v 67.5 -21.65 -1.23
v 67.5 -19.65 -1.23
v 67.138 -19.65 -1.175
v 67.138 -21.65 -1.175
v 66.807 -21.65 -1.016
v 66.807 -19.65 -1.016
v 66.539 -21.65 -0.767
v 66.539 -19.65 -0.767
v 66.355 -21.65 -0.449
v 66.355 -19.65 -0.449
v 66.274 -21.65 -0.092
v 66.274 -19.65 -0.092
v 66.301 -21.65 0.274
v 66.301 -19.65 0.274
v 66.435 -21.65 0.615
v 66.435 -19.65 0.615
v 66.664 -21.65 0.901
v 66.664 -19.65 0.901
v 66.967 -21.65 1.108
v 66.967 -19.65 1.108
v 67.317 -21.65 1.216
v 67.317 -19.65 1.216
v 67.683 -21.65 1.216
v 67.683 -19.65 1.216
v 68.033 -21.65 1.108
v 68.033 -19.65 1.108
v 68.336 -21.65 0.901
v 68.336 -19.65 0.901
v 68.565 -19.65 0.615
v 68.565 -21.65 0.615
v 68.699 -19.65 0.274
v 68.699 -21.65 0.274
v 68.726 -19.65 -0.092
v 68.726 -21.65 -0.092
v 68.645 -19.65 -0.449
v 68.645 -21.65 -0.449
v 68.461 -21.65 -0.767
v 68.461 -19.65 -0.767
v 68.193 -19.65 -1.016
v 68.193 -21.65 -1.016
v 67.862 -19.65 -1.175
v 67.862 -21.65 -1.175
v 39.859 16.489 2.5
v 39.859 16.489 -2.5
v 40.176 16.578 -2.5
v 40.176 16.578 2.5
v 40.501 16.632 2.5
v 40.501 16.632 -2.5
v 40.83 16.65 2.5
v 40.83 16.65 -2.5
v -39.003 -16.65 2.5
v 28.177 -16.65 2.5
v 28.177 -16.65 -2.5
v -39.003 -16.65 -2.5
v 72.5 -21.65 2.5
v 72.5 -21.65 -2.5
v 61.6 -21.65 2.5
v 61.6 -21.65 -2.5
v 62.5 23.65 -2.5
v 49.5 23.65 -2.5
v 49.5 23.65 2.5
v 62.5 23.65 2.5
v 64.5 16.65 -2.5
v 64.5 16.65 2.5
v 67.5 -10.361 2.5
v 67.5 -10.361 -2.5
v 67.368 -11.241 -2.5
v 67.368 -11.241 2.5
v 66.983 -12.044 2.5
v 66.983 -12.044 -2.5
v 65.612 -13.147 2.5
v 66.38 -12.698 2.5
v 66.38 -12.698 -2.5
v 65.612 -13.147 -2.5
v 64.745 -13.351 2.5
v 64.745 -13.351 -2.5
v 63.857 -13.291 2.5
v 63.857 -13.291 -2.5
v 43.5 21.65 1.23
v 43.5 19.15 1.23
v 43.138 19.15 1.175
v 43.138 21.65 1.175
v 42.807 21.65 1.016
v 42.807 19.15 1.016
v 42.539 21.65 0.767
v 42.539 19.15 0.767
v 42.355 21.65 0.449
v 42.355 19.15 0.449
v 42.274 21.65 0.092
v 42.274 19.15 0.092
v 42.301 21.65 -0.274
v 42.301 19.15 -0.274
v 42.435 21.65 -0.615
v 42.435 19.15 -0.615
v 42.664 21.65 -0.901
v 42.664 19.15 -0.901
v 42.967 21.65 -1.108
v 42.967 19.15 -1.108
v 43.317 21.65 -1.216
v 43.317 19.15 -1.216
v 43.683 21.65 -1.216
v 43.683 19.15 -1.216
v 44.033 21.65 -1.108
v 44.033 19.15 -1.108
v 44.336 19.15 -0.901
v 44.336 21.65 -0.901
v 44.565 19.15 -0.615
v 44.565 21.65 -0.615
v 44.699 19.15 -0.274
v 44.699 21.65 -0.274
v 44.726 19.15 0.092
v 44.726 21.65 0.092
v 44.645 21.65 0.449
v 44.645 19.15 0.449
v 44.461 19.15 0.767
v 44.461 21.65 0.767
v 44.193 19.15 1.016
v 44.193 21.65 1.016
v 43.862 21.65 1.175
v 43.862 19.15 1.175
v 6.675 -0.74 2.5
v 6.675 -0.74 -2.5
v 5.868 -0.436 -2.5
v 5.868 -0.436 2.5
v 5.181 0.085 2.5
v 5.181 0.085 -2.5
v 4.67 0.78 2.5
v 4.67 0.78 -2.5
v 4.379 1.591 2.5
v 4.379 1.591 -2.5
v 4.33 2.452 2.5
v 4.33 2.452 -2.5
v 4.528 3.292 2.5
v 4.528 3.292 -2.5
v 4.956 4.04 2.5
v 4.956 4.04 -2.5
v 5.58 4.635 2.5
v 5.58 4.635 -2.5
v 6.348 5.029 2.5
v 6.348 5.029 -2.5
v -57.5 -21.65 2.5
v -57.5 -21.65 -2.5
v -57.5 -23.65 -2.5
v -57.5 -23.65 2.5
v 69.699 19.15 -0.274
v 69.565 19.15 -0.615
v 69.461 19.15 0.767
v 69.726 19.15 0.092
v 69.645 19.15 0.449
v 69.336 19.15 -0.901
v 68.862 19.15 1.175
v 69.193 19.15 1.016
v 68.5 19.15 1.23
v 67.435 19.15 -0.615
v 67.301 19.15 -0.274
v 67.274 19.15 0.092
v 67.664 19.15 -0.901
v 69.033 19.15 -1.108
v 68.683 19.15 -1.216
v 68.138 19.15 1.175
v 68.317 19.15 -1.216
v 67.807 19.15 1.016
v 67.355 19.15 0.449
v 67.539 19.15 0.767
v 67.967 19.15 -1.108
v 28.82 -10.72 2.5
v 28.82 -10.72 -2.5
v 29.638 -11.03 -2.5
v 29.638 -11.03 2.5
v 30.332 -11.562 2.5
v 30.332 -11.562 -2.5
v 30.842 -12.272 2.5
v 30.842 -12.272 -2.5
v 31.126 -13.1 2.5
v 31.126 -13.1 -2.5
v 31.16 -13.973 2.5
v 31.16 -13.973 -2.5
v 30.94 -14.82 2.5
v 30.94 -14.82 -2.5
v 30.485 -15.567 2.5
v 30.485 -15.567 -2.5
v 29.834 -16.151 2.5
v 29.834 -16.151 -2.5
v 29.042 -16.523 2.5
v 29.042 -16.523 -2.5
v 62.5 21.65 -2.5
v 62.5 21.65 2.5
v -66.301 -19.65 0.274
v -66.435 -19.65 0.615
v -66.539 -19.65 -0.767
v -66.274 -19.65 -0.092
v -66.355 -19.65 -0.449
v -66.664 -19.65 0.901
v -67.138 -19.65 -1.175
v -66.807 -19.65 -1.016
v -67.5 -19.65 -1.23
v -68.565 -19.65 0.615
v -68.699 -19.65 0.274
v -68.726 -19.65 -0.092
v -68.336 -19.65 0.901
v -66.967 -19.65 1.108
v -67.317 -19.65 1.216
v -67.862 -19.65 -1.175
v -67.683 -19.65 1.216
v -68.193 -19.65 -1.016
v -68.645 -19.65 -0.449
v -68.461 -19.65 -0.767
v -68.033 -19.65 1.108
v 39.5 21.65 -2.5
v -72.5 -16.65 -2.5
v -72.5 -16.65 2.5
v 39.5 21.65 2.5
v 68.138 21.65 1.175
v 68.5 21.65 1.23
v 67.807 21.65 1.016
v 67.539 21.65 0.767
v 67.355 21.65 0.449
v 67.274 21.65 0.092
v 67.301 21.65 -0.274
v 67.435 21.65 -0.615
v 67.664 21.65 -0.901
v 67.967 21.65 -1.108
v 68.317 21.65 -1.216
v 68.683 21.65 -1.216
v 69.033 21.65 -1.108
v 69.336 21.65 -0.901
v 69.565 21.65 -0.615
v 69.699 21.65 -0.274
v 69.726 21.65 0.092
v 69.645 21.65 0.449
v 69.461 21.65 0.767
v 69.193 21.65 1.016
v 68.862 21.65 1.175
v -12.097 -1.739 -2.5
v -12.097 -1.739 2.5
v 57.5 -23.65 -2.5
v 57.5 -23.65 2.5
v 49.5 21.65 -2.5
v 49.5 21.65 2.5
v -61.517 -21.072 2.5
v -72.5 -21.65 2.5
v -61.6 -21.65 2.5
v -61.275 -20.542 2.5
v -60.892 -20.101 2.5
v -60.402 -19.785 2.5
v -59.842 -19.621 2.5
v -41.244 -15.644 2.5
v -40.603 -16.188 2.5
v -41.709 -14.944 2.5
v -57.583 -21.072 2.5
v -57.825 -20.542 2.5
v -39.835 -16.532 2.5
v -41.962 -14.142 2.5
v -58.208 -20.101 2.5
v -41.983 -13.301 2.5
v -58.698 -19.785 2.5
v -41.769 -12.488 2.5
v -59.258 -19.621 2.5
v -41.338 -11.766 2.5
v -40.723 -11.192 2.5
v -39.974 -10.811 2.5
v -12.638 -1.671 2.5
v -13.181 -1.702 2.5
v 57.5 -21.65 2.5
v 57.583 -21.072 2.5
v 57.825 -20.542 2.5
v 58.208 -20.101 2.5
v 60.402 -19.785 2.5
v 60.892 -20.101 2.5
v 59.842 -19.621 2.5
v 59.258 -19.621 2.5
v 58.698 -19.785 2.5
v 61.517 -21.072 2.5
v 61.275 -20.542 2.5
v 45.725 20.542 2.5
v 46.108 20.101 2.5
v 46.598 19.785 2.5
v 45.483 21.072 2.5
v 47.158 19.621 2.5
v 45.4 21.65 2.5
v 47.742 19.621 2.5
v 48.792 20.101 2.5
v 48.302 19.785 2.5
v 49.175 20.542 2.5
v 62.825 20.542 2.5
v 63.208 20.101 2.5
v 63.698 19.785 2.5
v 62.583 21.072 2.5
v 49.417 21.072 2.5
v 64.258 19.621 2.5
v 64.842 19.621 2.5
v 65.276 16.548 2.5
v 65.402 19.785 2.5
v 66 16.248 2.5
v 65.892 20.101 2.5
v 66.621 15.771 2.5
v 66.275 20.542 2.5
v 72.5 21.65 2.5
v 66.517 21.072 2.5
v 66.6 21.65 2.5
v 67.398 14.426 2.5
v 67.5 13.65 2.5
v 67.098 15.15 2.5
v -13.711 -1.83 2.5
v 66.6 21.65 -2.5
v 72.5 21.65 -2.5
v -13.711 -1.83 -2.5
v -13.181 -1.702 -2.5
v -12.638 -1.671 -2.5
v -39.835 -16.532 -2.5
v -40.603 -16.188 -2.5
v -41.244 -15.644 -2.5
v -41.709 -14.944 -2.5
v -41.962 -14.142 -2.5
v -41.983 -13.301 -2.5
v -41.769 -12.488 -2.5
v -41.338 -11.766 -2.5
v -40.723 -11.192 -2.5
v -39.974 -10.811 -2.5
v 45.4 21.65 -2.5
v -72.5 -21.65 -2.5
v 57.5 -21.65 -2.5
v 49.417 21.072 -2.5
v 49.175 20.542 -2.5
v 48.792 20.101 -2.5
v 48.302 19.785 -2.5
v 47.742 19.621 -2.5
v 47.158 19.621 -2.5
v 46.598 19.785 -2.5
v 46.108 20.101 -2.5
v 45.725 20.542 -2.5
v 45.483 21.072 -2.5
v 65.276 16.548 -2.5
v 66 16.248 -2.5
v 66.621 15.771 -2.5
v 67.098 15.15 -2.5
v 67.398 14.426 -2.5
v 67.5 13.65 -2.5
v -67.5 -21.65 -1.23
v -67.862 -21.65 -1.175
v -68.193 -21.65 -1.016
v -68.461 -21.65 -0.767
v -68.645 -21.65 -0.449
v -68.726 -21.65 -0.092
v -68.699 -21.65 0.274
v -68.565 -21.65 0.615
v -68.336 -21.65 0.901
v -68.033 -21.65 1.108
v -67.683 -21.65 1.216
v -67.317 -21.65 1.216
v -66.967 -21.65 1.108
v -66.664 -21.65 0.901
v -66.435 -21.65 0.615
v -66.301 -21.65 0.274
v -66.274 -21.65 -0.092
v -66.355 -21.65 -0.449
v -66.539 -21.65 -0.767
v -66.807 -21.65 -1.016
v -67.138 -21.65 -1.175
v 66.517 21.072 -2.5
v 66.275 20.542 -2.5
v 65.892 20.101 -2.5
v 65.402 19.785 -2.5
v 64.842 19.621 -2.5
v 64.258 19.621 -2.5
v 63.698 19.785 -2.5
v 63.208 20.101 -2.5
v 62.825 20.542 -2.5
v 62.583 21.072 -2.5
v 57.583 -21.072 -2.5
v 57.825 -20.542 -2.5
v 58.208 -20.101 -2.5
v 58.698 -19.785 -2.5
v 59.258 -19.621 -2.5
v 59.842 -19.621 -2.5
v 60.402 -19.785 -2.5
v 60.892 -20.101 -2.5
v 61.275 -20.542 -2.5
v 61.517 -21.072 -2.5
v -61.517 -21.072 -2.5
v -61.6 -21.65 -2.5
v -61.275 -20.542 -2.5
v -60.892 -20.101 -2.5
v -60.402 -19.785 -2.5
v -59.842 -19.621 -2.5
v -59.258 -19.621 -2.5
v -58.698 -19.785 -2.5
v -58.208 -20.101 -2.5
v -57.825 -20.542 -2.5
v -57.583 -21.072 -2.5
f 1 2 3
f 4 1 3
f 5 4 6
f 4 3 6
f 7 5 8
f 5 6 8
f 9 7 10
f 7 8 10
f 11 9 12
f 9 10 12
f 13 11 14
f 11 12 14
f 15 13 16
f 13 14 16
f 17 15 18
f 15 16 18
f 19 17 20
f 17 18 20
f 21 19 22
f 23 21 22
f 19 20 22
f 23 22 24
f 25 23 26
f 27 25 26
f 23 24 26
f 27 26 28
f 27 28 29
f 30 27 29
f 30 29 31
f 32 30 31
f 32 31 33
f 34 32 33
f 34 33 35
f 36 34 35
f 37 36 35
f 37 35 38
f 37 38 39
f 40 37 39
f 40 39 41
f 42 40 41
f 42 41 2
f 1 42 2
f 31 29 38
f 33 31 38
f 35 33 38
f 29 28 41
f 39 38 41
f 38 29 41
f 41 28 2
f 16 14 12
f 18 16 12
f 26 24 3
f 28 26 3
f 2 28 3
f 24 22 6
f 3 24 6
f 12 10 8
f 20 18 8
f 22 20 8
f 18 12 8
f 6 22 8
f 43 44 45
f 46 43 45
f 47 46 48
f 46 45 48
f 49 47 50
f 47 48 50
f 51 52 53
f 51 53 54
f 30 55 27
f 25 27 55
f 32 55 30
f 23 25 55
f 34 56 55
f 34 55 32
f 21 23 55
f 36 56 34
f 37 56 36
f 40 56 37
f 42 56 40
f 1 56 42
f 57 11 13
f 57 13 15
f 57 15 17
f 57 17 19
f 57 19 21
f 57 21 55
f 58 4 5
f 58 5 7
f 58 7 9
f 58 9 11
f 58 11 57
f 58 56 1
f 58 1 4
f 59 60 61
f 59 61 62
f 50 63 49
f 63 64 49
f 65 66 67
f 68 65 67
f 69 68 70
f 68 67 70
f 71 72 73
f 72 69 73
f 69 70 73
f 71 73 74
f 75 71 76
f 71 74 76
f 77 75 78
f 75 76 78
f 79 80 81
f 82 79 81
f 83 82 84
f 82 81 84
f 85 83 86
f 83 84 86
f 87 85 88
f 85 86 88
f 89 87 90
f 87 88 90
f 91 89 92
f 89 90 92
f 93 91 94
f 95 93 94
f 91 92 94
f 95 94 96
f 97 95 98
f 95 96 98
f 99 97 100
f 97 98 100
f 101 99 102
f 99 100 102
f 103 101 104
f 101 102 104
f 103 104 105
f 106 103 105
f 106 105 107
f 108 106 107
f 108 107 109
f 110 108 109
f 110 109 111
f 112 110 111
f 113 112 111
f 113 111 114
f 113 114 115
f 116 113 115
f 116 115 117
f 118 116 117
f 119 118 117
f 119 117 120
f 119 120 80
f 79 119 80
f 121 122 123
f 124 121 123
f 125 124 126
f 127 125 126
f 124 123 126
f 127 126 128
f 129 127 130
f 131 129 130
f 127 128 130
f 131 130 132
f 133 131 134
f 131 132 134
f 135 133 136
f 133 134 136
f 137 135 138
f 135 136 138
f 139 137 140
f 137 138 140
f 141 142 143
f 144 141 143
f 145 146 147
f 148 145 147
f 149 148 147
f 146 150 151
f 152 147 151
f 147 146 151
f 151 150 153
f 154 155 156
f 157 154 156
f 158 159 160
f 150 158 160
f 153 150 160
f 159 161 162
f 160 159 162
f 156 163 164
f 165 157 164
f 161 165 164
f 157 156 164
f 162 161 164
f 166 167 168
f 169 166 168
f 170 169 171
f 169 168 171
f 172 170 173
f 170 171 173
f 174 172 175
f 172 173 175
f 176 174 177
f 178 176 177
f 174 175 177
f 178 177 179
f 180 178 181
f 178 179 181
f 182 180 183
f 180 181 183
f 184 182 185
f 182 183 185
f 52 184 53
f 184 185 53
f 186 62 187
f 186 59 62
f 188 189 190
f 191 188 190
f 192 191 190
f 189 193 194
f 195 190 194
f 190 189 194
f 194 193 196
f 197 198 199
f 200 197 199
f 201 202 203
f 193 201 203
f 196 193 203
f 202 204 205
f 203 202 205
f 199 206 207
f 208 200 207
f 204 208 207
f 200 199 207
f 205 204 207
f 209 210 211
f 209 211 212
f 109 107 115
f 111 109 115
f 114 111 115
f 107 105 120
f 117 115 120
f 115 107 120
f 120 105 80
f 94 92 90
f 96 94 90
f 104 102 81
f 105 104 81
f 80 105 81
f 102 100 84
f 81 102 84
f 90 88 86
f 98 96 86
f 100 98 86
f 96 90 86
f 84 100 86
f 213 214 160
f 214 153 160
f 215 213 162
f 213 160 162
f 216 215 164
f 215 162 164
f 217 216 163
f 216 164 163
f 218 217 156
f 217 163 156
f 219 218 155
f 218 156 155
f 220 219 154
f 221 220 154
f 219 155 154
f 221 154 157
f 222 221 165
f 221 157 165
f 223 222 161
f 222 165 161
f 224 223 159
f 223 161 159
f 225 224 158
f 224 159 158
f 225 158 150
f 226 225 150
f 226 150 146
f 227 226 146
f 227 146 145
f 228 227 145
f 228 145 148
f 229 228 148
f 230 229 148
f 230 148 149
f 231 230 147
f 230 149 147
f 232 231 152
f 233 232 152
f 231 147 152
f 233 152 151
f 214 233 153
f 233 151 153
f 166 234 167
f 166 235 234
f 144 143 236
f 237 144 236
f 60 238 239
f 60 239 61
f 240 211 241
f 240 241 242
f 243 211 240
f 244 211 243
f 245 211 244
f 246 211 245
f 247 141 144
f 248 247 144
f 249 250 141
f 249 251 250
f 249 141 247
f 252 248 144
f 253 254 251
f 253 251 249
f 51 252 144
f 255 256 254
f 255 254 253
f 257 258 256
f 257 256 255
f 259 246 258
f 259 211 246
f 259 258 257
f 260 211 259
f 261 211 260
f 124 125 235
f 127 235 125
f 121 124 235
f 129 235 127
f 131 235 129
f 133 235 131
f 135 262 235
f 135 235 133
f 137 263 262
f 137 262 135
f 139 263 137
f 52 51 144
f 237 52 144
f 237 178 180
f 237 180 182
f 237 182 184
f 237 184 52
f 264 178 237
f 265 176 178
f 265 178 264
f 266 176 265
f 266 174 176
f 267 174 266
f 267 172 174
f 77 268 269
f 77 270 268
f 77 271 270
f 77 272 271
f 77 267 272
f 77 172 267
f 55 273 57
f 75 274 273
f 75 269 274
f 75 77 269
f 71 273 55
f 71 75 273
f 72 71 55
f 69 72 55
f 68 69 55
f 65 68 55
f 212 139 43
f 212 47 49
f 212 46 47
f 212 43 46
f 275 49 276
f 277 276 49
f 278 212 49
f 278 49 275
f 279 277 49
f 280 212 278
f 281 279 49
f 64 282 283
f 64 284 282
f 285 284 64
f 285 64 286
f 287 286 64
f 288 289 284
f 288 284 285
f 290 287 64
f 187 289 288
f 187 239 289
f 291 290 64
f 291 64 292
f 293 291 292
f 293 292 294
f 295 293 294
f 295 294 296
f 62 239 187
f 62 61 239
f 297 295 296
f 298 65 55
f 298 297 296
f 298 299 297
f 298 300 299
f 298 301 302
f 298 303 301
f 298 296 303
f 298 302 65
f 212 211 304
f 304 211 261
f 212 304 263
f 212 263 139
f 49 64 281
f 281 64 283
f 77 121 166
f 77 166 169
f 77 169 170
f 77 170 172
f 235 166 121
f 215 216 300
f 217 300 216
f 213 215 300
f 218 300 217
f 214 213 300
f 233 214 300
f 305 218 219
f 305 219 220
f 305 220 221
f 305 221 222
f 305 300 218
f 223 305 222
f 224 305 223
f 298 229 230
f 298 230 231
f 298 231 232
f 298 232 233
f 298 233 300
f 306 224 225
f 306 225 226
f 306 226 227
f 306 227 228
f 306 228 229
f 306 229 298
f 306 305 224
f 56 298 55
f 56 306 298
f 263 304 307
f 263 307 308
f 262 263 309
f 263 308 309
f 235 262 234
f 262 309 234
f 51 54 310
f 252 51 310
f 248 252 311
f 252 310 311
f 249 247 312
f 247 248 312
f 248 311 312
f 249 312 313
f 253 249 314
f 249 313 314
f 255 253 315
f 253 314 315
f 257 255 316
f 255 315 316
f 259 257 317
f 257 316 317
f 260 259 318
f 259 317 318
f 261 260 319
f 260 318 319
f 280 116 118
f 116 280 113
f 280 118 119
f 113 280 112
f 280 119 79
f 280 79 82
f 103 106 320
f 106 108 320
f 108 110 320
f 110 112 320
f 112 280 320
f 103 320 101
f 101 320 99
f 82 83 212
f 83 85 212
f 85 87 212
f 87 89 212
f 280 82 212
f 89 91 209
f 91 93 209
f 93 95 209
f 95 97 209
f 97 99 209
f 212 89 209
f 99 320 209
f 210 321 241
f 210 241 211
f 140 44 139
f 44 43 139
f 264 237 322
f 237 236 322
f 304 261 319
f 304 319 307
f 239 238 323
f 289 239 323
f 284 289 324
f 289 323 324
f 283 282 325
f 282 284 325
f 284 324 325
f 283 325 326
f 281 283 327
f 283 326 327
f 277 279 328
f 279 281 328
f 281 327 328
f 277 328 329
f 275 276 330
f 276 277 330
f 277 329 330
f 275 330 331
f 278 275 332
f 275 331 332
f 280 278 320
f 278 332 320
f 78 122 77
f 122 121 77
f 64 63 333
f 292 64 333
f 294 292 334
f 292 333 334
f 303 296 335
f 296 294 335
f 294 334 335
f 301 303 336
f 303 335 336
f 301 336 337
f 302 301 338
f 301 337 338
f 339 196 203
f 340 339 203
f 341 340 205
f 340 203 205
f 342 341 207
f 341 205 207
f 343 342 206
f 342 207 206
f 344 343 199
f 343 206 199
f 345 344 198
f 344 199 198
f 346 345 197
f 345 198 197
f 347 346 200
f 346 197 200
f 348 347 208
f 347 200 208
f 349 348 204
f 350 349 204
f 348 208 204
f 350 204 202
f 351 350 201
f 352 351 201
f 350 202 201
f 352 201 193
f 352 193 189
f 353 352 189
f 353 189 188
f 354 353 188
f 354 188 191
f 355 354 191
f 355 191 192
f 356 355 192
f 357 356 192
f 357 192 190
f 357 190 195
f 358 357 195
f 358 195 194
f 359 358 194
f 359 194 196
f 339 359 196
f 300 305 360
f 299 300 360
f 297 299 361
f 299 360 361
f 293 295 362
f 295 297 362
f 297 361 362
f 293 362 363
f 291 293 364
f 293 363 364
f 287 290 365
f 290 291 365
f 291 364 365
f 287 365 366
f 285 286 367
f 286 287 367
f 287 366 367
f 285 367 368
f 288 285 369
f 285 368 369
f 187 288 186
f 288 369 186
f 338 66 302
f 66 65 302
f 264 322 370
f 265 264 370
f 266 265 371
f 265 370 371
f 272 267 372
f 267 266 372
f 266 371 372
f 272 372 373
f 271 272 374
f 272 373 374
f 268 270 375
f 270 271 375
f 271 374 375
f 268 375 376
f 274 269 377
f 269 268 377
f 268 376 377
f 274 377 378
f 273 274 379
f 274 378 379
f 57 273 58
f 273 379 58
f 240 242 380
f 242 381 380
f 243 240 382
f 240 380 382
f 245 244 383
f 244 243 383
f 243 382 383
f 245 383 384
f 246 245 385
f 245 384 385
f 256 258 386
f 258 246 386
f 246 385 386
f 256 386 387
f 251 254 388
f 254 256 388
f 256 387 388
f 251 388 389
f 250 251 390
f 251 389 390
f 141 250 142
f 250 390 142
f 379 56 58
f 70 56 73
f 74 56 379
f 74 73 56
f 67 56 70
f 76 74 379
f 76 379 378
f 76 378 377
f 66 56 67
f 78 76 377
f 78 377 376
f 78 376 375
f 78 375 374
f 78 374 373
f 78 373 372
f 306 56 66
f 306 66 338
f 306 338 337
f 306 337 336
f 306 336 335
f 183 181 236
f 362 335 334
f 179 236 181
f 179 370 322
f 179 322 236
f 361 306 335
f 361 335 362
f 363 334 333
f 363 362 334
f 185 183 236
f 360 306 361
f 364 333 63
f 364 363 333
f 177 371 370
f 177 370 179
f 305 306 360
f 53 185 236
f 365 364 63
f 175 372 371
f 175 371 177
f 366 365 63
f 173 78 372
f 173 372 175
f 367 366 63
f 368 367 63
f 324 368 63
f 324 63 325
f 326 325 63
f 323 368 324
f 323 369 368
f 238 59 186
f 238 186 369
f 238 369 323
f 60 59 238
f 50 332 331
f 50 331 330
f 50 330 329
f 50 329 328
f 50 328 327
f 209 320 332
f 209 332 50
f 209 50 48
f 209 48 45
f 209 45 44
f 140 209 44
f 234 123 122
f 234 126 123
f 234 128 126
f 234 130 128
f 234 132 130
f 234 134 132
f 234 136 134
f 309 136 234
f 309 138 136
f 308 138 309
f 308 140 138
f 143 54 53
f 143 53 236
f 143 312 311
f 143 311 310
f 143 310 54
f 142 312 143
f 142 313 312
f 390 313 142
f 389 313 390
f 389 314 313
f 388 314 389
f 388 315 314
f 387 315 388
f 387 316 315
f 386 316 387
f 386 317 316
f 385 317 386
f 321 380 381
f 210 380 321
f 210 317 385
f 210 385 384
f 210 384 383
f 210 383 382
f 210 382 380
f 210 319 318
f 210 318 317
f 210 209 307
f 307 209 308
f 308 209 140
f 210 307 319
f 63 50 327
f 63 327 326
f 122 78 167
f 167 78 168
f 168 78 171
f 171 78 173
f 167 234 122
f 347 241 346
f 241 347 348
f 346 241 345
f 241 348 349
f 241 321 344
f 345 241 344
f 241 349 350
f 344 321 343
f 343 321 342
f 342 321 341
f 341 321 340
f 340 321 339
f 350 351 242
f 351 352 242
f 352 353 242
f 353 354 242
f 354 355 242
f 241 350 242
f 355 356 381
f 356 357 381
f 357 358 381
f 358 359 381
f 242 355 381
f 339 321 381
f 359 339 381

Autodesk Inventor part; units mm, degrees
ref_plane "YZ Plane" through (0, 0, 0) normal (1, 0, 0) x (0, 1, 0)
ref_plane "XZ Plane" through (0, 0, 0) normal (0, 1, 0) x (-1, 0, 0)
ref_plane "XY Plane" through (0, 0, 0) normal (0, 0, 1) x (1, 0, 0)
sketch "スケッチ1" plane through (0, 0, 0) normal (0, 0, 1) x (1, 0, 0)
  line L0 (-72.5, -21.65) -> (72.5, -21.65) construction
  line L1 (72.5, -21.65) -> (72.5, 21.65) construction
  line L2 (72.5, 21.65) -> (-72.5, 21.65) construction
  line L3 (-72.5, 21.65) -> (-72.5, -21.65) construction
  line L4 (-72.5, -21.65) -> (72.5, 21.65) construction
  line L5 (72.5, -21.65) -> (-72.5, 21.65) construction
  line L6 (-67.5, 21.65) -> (-67.5, -21.65) construction
  line L7 (0, 0) -> (0, 21.65) construction
  line L8 (0, 0) -> (-72.5, 0) construction
  line L9 (67.5, 21.65) -> (67.5, -21.65) construction
  line L10 (-72.5, -21.65) -> (-61.6, -21.65)
  line L11 (49.5, 21.65) -> (49.5, 23.65)
  line L12 (49.5, 23.65) -> (62.5, 23.65)
  line L13 (62.5, 23.65) -> (62.5, 21.65)
  line L14 (66.6, 21.65) -> (72.5, 21.65)
  line L15 (72.5, 21.65) -> (72.5, -21.65)
  line L16 (72.5, -21.65) -> (61.6, -21.65)
  line L17 (-57.5, -21.65) -> (-57.5, -23.65)
  line L18 (-57.5, -23.65) -> (57.5, -23.65)
  line L19 (57.5, -23.65) -> (57.5, -21.65)
  arc A0 (45.4, 21.65) -> (49.5, 21.65) centre (47.45, 21.65) ccw
  arc A1 (62.5, 21.65) -> (66.6, 21.65) centre (64.55, 21.65) ccw
  arc A2 (-57.5, -21.65) -> (-61.6, -21.65) centre (-59.55, -21.65) ccw
  arc A3 (61.6, -21.65) -> (57.5, -21.65) centre (59.55, -21.65) ccw
  line L20 (-72.5, -21.65) -> (-72.5, -16.65)
  line L21 (-72.5, -16.65) -> (39.5, 21.65)
  line L22 (45.4, 21.65) -> (39.5, 21.65)
  line L23 (66.95, 24.476) -> (70.05, 24.476) construction
  line L24 (70.05, 24.476) -> (70.05, 13.3235) construction
  line L25 (70.05, 13.3235) -> (66.95, 13.3235) construction
  line L26 (66.95, 13.3235) -> (66.95, 24.476) construction
  line L27 (68.5, 24.476) -> (68.5, 13.3235) construction
  line L28 (41.95, 24.476) -> (45.05, 24.476) construction
  line L29 (45.05, 24.476) -> (45.05, 13.9945) construction
  line L30 (45.05, 13.9945) -> (41.95, 13.9945) construction
  line L31 (41.95, 13.9945) -> (41.95, 24.476) construction
  line L32 (43.5, 24.476) -> (43.5, 13.9945) construction
  dimension "d16" = 5
  dimension "d20" = 43.3
  dimension "d40" = 135
  dimension "d41" = 10
  dimension "d42" = 2.05
  dimension "d43" = 2
  dimension "d44" = 5
  dimension "d45" = 10
  dimension "d46" = 10
  dimension "d48" = 3.1
  dimension "d50" = 4
  dimension "d51" = 25
  dimension "d52" = 3.1
  dimension "d62" = 6
  dimension "d63" = 6
extrude "押し出し1" add sketch "スケッチ1" along normal blind 2.5
mirror "ミラー1" about plane through (8.3734, -6.8299, 0) normal (0, 0, -1) of "押し出し1"
sketch "スケッチ2" plane through (-72.5, -21.65, 2.5) normal (0, -1, 0) x (1, 0, 0)
  line L0 (0, -5) -> (0, 0)
  line L1 (15, -5) -> (130, -5) construction
  line L2 (72.5, -5) -> (72.5, 0) construction
  line L3 (15, 0) -> (130, 0) construction
  point P0 (72.5, -2.5)
  point P1 (5, -2.5)
  point P2 (140, -2.5)
  point P3 (0, -2.5)
  dimension "d26" = 5
hole "穴1" at (-67.5, -21.65, 0) at (67.5, -21.65, 0) direction (0, 1, 0) diameter 2.459 depth 2 thread size "M3x0.5" class "6H" standard "ISO Metric profile"
sketch "スケッチ4" plane through (66.6, 21.65, 2.5) normal (0, 1, 0) x (1, 0, 0)
  line L0 (5.9, 5) -> (5.9, 0) projected
  point P0 (-66.6, 2.5)
  point P1 (1.9, 2.5)
  point P2 (-23.1, 2.5)
  point P3 (5.9, 2.5)
  dimension "d53" = 4
  dimension "d54" = 25
hole "穴2" at (68.5, 21.65, 0) at (43.5, 21.65, 0) direction (0, -1, 0) diameter 2.459 depth 2.5 thread size "M3x0.5" class "6H" standard "ISO Metric profile"
sketch "スケッチ6" plane through (0, 0, 2.5) normal (0, 0, 1) x (1, 0, 0)
  line L0 (61.6, -21.65) -> (72.5, -21.65) projected
  line L1 (72.5, -21.65) -> (72.5, 21.65) projected
  line L2 (72.5, 21.65) -> (66.6, 21.65) projected
  line L3 (39.5, 21.65) -> (-72.5, -16.65) projected
  line L4 (67.5, 16.65) -> (67.5, -16.65) construction
  line L5 (67.5, -16.65) -> (-57.0473, -16.65) construction
  line L6 (-57.0473, -16.65) -> (40.3313, 16.65) construction
  line L7 (40.3313, 16.65) -> (67.5, 16.65) construction
  line L8 (67.5, -16.65) -> (-8.358, 0) construction
  line L9 (67.5, -14.0905) -> (67.5, 16.65)
  line L10 (67.5, 16.65) -> (40.3313, 16.65)
  line L11 (40.3313, 16.65) -> (-3.7993, 1.5589)
  line L12 (-3.7993, 1.5589) -> (67.5, -14.0905)
  line L13 (55.8388, -16.65) -> (-57.0473, -16.65)
  line L14 (-57.0473, -16.65) -> (-12.9167, -1.5589)
  line L15 (-12.9167, -1.5589) -> (55.8388, -16.65)
  point P0 (0, 0)
  dimension "d72" = 5
  dimension "d73" = 5
  dimension "d74" = 5
  dimension "d75" = 5
  dimension "d76" = 5
extrude "押し出し4" cut sketch "スケッチ6" against normal blind 10
fillet "フィレット3" radius 3 7 edges at (-3.7993, 1.5589, 0) (40.3313, 16.65, 0) (67.5, -14.0905, 0) (55.8388, -16.65, 0) (-12.9167, -1.5589, 0) (-57.0473, -16.65, 0) (67.5, 16.65, 0)
equation "\"d16\" = d4"
equation "\"d40\" = d6"
equation "\"d41\" = d3"
equation "\"d46\" = d45"
equation "\"d63\" = d62"
equation "\"d26\" = d4"
equation "\"d53\" = d50"
equation "\"d54\" = d51"
equation "\"d73\" = d72"
equation "\"d74\" = d73"
equation "\"d75\" = d74"
equation "\"d76\" = d74"
equation "\"d4\" = 5"
equation "\"d6\" = 135"
equation "\"d3\" = 10"
properties part number "前腕_サブフレーム_1_1" material "アセタール樹脂、黒"
